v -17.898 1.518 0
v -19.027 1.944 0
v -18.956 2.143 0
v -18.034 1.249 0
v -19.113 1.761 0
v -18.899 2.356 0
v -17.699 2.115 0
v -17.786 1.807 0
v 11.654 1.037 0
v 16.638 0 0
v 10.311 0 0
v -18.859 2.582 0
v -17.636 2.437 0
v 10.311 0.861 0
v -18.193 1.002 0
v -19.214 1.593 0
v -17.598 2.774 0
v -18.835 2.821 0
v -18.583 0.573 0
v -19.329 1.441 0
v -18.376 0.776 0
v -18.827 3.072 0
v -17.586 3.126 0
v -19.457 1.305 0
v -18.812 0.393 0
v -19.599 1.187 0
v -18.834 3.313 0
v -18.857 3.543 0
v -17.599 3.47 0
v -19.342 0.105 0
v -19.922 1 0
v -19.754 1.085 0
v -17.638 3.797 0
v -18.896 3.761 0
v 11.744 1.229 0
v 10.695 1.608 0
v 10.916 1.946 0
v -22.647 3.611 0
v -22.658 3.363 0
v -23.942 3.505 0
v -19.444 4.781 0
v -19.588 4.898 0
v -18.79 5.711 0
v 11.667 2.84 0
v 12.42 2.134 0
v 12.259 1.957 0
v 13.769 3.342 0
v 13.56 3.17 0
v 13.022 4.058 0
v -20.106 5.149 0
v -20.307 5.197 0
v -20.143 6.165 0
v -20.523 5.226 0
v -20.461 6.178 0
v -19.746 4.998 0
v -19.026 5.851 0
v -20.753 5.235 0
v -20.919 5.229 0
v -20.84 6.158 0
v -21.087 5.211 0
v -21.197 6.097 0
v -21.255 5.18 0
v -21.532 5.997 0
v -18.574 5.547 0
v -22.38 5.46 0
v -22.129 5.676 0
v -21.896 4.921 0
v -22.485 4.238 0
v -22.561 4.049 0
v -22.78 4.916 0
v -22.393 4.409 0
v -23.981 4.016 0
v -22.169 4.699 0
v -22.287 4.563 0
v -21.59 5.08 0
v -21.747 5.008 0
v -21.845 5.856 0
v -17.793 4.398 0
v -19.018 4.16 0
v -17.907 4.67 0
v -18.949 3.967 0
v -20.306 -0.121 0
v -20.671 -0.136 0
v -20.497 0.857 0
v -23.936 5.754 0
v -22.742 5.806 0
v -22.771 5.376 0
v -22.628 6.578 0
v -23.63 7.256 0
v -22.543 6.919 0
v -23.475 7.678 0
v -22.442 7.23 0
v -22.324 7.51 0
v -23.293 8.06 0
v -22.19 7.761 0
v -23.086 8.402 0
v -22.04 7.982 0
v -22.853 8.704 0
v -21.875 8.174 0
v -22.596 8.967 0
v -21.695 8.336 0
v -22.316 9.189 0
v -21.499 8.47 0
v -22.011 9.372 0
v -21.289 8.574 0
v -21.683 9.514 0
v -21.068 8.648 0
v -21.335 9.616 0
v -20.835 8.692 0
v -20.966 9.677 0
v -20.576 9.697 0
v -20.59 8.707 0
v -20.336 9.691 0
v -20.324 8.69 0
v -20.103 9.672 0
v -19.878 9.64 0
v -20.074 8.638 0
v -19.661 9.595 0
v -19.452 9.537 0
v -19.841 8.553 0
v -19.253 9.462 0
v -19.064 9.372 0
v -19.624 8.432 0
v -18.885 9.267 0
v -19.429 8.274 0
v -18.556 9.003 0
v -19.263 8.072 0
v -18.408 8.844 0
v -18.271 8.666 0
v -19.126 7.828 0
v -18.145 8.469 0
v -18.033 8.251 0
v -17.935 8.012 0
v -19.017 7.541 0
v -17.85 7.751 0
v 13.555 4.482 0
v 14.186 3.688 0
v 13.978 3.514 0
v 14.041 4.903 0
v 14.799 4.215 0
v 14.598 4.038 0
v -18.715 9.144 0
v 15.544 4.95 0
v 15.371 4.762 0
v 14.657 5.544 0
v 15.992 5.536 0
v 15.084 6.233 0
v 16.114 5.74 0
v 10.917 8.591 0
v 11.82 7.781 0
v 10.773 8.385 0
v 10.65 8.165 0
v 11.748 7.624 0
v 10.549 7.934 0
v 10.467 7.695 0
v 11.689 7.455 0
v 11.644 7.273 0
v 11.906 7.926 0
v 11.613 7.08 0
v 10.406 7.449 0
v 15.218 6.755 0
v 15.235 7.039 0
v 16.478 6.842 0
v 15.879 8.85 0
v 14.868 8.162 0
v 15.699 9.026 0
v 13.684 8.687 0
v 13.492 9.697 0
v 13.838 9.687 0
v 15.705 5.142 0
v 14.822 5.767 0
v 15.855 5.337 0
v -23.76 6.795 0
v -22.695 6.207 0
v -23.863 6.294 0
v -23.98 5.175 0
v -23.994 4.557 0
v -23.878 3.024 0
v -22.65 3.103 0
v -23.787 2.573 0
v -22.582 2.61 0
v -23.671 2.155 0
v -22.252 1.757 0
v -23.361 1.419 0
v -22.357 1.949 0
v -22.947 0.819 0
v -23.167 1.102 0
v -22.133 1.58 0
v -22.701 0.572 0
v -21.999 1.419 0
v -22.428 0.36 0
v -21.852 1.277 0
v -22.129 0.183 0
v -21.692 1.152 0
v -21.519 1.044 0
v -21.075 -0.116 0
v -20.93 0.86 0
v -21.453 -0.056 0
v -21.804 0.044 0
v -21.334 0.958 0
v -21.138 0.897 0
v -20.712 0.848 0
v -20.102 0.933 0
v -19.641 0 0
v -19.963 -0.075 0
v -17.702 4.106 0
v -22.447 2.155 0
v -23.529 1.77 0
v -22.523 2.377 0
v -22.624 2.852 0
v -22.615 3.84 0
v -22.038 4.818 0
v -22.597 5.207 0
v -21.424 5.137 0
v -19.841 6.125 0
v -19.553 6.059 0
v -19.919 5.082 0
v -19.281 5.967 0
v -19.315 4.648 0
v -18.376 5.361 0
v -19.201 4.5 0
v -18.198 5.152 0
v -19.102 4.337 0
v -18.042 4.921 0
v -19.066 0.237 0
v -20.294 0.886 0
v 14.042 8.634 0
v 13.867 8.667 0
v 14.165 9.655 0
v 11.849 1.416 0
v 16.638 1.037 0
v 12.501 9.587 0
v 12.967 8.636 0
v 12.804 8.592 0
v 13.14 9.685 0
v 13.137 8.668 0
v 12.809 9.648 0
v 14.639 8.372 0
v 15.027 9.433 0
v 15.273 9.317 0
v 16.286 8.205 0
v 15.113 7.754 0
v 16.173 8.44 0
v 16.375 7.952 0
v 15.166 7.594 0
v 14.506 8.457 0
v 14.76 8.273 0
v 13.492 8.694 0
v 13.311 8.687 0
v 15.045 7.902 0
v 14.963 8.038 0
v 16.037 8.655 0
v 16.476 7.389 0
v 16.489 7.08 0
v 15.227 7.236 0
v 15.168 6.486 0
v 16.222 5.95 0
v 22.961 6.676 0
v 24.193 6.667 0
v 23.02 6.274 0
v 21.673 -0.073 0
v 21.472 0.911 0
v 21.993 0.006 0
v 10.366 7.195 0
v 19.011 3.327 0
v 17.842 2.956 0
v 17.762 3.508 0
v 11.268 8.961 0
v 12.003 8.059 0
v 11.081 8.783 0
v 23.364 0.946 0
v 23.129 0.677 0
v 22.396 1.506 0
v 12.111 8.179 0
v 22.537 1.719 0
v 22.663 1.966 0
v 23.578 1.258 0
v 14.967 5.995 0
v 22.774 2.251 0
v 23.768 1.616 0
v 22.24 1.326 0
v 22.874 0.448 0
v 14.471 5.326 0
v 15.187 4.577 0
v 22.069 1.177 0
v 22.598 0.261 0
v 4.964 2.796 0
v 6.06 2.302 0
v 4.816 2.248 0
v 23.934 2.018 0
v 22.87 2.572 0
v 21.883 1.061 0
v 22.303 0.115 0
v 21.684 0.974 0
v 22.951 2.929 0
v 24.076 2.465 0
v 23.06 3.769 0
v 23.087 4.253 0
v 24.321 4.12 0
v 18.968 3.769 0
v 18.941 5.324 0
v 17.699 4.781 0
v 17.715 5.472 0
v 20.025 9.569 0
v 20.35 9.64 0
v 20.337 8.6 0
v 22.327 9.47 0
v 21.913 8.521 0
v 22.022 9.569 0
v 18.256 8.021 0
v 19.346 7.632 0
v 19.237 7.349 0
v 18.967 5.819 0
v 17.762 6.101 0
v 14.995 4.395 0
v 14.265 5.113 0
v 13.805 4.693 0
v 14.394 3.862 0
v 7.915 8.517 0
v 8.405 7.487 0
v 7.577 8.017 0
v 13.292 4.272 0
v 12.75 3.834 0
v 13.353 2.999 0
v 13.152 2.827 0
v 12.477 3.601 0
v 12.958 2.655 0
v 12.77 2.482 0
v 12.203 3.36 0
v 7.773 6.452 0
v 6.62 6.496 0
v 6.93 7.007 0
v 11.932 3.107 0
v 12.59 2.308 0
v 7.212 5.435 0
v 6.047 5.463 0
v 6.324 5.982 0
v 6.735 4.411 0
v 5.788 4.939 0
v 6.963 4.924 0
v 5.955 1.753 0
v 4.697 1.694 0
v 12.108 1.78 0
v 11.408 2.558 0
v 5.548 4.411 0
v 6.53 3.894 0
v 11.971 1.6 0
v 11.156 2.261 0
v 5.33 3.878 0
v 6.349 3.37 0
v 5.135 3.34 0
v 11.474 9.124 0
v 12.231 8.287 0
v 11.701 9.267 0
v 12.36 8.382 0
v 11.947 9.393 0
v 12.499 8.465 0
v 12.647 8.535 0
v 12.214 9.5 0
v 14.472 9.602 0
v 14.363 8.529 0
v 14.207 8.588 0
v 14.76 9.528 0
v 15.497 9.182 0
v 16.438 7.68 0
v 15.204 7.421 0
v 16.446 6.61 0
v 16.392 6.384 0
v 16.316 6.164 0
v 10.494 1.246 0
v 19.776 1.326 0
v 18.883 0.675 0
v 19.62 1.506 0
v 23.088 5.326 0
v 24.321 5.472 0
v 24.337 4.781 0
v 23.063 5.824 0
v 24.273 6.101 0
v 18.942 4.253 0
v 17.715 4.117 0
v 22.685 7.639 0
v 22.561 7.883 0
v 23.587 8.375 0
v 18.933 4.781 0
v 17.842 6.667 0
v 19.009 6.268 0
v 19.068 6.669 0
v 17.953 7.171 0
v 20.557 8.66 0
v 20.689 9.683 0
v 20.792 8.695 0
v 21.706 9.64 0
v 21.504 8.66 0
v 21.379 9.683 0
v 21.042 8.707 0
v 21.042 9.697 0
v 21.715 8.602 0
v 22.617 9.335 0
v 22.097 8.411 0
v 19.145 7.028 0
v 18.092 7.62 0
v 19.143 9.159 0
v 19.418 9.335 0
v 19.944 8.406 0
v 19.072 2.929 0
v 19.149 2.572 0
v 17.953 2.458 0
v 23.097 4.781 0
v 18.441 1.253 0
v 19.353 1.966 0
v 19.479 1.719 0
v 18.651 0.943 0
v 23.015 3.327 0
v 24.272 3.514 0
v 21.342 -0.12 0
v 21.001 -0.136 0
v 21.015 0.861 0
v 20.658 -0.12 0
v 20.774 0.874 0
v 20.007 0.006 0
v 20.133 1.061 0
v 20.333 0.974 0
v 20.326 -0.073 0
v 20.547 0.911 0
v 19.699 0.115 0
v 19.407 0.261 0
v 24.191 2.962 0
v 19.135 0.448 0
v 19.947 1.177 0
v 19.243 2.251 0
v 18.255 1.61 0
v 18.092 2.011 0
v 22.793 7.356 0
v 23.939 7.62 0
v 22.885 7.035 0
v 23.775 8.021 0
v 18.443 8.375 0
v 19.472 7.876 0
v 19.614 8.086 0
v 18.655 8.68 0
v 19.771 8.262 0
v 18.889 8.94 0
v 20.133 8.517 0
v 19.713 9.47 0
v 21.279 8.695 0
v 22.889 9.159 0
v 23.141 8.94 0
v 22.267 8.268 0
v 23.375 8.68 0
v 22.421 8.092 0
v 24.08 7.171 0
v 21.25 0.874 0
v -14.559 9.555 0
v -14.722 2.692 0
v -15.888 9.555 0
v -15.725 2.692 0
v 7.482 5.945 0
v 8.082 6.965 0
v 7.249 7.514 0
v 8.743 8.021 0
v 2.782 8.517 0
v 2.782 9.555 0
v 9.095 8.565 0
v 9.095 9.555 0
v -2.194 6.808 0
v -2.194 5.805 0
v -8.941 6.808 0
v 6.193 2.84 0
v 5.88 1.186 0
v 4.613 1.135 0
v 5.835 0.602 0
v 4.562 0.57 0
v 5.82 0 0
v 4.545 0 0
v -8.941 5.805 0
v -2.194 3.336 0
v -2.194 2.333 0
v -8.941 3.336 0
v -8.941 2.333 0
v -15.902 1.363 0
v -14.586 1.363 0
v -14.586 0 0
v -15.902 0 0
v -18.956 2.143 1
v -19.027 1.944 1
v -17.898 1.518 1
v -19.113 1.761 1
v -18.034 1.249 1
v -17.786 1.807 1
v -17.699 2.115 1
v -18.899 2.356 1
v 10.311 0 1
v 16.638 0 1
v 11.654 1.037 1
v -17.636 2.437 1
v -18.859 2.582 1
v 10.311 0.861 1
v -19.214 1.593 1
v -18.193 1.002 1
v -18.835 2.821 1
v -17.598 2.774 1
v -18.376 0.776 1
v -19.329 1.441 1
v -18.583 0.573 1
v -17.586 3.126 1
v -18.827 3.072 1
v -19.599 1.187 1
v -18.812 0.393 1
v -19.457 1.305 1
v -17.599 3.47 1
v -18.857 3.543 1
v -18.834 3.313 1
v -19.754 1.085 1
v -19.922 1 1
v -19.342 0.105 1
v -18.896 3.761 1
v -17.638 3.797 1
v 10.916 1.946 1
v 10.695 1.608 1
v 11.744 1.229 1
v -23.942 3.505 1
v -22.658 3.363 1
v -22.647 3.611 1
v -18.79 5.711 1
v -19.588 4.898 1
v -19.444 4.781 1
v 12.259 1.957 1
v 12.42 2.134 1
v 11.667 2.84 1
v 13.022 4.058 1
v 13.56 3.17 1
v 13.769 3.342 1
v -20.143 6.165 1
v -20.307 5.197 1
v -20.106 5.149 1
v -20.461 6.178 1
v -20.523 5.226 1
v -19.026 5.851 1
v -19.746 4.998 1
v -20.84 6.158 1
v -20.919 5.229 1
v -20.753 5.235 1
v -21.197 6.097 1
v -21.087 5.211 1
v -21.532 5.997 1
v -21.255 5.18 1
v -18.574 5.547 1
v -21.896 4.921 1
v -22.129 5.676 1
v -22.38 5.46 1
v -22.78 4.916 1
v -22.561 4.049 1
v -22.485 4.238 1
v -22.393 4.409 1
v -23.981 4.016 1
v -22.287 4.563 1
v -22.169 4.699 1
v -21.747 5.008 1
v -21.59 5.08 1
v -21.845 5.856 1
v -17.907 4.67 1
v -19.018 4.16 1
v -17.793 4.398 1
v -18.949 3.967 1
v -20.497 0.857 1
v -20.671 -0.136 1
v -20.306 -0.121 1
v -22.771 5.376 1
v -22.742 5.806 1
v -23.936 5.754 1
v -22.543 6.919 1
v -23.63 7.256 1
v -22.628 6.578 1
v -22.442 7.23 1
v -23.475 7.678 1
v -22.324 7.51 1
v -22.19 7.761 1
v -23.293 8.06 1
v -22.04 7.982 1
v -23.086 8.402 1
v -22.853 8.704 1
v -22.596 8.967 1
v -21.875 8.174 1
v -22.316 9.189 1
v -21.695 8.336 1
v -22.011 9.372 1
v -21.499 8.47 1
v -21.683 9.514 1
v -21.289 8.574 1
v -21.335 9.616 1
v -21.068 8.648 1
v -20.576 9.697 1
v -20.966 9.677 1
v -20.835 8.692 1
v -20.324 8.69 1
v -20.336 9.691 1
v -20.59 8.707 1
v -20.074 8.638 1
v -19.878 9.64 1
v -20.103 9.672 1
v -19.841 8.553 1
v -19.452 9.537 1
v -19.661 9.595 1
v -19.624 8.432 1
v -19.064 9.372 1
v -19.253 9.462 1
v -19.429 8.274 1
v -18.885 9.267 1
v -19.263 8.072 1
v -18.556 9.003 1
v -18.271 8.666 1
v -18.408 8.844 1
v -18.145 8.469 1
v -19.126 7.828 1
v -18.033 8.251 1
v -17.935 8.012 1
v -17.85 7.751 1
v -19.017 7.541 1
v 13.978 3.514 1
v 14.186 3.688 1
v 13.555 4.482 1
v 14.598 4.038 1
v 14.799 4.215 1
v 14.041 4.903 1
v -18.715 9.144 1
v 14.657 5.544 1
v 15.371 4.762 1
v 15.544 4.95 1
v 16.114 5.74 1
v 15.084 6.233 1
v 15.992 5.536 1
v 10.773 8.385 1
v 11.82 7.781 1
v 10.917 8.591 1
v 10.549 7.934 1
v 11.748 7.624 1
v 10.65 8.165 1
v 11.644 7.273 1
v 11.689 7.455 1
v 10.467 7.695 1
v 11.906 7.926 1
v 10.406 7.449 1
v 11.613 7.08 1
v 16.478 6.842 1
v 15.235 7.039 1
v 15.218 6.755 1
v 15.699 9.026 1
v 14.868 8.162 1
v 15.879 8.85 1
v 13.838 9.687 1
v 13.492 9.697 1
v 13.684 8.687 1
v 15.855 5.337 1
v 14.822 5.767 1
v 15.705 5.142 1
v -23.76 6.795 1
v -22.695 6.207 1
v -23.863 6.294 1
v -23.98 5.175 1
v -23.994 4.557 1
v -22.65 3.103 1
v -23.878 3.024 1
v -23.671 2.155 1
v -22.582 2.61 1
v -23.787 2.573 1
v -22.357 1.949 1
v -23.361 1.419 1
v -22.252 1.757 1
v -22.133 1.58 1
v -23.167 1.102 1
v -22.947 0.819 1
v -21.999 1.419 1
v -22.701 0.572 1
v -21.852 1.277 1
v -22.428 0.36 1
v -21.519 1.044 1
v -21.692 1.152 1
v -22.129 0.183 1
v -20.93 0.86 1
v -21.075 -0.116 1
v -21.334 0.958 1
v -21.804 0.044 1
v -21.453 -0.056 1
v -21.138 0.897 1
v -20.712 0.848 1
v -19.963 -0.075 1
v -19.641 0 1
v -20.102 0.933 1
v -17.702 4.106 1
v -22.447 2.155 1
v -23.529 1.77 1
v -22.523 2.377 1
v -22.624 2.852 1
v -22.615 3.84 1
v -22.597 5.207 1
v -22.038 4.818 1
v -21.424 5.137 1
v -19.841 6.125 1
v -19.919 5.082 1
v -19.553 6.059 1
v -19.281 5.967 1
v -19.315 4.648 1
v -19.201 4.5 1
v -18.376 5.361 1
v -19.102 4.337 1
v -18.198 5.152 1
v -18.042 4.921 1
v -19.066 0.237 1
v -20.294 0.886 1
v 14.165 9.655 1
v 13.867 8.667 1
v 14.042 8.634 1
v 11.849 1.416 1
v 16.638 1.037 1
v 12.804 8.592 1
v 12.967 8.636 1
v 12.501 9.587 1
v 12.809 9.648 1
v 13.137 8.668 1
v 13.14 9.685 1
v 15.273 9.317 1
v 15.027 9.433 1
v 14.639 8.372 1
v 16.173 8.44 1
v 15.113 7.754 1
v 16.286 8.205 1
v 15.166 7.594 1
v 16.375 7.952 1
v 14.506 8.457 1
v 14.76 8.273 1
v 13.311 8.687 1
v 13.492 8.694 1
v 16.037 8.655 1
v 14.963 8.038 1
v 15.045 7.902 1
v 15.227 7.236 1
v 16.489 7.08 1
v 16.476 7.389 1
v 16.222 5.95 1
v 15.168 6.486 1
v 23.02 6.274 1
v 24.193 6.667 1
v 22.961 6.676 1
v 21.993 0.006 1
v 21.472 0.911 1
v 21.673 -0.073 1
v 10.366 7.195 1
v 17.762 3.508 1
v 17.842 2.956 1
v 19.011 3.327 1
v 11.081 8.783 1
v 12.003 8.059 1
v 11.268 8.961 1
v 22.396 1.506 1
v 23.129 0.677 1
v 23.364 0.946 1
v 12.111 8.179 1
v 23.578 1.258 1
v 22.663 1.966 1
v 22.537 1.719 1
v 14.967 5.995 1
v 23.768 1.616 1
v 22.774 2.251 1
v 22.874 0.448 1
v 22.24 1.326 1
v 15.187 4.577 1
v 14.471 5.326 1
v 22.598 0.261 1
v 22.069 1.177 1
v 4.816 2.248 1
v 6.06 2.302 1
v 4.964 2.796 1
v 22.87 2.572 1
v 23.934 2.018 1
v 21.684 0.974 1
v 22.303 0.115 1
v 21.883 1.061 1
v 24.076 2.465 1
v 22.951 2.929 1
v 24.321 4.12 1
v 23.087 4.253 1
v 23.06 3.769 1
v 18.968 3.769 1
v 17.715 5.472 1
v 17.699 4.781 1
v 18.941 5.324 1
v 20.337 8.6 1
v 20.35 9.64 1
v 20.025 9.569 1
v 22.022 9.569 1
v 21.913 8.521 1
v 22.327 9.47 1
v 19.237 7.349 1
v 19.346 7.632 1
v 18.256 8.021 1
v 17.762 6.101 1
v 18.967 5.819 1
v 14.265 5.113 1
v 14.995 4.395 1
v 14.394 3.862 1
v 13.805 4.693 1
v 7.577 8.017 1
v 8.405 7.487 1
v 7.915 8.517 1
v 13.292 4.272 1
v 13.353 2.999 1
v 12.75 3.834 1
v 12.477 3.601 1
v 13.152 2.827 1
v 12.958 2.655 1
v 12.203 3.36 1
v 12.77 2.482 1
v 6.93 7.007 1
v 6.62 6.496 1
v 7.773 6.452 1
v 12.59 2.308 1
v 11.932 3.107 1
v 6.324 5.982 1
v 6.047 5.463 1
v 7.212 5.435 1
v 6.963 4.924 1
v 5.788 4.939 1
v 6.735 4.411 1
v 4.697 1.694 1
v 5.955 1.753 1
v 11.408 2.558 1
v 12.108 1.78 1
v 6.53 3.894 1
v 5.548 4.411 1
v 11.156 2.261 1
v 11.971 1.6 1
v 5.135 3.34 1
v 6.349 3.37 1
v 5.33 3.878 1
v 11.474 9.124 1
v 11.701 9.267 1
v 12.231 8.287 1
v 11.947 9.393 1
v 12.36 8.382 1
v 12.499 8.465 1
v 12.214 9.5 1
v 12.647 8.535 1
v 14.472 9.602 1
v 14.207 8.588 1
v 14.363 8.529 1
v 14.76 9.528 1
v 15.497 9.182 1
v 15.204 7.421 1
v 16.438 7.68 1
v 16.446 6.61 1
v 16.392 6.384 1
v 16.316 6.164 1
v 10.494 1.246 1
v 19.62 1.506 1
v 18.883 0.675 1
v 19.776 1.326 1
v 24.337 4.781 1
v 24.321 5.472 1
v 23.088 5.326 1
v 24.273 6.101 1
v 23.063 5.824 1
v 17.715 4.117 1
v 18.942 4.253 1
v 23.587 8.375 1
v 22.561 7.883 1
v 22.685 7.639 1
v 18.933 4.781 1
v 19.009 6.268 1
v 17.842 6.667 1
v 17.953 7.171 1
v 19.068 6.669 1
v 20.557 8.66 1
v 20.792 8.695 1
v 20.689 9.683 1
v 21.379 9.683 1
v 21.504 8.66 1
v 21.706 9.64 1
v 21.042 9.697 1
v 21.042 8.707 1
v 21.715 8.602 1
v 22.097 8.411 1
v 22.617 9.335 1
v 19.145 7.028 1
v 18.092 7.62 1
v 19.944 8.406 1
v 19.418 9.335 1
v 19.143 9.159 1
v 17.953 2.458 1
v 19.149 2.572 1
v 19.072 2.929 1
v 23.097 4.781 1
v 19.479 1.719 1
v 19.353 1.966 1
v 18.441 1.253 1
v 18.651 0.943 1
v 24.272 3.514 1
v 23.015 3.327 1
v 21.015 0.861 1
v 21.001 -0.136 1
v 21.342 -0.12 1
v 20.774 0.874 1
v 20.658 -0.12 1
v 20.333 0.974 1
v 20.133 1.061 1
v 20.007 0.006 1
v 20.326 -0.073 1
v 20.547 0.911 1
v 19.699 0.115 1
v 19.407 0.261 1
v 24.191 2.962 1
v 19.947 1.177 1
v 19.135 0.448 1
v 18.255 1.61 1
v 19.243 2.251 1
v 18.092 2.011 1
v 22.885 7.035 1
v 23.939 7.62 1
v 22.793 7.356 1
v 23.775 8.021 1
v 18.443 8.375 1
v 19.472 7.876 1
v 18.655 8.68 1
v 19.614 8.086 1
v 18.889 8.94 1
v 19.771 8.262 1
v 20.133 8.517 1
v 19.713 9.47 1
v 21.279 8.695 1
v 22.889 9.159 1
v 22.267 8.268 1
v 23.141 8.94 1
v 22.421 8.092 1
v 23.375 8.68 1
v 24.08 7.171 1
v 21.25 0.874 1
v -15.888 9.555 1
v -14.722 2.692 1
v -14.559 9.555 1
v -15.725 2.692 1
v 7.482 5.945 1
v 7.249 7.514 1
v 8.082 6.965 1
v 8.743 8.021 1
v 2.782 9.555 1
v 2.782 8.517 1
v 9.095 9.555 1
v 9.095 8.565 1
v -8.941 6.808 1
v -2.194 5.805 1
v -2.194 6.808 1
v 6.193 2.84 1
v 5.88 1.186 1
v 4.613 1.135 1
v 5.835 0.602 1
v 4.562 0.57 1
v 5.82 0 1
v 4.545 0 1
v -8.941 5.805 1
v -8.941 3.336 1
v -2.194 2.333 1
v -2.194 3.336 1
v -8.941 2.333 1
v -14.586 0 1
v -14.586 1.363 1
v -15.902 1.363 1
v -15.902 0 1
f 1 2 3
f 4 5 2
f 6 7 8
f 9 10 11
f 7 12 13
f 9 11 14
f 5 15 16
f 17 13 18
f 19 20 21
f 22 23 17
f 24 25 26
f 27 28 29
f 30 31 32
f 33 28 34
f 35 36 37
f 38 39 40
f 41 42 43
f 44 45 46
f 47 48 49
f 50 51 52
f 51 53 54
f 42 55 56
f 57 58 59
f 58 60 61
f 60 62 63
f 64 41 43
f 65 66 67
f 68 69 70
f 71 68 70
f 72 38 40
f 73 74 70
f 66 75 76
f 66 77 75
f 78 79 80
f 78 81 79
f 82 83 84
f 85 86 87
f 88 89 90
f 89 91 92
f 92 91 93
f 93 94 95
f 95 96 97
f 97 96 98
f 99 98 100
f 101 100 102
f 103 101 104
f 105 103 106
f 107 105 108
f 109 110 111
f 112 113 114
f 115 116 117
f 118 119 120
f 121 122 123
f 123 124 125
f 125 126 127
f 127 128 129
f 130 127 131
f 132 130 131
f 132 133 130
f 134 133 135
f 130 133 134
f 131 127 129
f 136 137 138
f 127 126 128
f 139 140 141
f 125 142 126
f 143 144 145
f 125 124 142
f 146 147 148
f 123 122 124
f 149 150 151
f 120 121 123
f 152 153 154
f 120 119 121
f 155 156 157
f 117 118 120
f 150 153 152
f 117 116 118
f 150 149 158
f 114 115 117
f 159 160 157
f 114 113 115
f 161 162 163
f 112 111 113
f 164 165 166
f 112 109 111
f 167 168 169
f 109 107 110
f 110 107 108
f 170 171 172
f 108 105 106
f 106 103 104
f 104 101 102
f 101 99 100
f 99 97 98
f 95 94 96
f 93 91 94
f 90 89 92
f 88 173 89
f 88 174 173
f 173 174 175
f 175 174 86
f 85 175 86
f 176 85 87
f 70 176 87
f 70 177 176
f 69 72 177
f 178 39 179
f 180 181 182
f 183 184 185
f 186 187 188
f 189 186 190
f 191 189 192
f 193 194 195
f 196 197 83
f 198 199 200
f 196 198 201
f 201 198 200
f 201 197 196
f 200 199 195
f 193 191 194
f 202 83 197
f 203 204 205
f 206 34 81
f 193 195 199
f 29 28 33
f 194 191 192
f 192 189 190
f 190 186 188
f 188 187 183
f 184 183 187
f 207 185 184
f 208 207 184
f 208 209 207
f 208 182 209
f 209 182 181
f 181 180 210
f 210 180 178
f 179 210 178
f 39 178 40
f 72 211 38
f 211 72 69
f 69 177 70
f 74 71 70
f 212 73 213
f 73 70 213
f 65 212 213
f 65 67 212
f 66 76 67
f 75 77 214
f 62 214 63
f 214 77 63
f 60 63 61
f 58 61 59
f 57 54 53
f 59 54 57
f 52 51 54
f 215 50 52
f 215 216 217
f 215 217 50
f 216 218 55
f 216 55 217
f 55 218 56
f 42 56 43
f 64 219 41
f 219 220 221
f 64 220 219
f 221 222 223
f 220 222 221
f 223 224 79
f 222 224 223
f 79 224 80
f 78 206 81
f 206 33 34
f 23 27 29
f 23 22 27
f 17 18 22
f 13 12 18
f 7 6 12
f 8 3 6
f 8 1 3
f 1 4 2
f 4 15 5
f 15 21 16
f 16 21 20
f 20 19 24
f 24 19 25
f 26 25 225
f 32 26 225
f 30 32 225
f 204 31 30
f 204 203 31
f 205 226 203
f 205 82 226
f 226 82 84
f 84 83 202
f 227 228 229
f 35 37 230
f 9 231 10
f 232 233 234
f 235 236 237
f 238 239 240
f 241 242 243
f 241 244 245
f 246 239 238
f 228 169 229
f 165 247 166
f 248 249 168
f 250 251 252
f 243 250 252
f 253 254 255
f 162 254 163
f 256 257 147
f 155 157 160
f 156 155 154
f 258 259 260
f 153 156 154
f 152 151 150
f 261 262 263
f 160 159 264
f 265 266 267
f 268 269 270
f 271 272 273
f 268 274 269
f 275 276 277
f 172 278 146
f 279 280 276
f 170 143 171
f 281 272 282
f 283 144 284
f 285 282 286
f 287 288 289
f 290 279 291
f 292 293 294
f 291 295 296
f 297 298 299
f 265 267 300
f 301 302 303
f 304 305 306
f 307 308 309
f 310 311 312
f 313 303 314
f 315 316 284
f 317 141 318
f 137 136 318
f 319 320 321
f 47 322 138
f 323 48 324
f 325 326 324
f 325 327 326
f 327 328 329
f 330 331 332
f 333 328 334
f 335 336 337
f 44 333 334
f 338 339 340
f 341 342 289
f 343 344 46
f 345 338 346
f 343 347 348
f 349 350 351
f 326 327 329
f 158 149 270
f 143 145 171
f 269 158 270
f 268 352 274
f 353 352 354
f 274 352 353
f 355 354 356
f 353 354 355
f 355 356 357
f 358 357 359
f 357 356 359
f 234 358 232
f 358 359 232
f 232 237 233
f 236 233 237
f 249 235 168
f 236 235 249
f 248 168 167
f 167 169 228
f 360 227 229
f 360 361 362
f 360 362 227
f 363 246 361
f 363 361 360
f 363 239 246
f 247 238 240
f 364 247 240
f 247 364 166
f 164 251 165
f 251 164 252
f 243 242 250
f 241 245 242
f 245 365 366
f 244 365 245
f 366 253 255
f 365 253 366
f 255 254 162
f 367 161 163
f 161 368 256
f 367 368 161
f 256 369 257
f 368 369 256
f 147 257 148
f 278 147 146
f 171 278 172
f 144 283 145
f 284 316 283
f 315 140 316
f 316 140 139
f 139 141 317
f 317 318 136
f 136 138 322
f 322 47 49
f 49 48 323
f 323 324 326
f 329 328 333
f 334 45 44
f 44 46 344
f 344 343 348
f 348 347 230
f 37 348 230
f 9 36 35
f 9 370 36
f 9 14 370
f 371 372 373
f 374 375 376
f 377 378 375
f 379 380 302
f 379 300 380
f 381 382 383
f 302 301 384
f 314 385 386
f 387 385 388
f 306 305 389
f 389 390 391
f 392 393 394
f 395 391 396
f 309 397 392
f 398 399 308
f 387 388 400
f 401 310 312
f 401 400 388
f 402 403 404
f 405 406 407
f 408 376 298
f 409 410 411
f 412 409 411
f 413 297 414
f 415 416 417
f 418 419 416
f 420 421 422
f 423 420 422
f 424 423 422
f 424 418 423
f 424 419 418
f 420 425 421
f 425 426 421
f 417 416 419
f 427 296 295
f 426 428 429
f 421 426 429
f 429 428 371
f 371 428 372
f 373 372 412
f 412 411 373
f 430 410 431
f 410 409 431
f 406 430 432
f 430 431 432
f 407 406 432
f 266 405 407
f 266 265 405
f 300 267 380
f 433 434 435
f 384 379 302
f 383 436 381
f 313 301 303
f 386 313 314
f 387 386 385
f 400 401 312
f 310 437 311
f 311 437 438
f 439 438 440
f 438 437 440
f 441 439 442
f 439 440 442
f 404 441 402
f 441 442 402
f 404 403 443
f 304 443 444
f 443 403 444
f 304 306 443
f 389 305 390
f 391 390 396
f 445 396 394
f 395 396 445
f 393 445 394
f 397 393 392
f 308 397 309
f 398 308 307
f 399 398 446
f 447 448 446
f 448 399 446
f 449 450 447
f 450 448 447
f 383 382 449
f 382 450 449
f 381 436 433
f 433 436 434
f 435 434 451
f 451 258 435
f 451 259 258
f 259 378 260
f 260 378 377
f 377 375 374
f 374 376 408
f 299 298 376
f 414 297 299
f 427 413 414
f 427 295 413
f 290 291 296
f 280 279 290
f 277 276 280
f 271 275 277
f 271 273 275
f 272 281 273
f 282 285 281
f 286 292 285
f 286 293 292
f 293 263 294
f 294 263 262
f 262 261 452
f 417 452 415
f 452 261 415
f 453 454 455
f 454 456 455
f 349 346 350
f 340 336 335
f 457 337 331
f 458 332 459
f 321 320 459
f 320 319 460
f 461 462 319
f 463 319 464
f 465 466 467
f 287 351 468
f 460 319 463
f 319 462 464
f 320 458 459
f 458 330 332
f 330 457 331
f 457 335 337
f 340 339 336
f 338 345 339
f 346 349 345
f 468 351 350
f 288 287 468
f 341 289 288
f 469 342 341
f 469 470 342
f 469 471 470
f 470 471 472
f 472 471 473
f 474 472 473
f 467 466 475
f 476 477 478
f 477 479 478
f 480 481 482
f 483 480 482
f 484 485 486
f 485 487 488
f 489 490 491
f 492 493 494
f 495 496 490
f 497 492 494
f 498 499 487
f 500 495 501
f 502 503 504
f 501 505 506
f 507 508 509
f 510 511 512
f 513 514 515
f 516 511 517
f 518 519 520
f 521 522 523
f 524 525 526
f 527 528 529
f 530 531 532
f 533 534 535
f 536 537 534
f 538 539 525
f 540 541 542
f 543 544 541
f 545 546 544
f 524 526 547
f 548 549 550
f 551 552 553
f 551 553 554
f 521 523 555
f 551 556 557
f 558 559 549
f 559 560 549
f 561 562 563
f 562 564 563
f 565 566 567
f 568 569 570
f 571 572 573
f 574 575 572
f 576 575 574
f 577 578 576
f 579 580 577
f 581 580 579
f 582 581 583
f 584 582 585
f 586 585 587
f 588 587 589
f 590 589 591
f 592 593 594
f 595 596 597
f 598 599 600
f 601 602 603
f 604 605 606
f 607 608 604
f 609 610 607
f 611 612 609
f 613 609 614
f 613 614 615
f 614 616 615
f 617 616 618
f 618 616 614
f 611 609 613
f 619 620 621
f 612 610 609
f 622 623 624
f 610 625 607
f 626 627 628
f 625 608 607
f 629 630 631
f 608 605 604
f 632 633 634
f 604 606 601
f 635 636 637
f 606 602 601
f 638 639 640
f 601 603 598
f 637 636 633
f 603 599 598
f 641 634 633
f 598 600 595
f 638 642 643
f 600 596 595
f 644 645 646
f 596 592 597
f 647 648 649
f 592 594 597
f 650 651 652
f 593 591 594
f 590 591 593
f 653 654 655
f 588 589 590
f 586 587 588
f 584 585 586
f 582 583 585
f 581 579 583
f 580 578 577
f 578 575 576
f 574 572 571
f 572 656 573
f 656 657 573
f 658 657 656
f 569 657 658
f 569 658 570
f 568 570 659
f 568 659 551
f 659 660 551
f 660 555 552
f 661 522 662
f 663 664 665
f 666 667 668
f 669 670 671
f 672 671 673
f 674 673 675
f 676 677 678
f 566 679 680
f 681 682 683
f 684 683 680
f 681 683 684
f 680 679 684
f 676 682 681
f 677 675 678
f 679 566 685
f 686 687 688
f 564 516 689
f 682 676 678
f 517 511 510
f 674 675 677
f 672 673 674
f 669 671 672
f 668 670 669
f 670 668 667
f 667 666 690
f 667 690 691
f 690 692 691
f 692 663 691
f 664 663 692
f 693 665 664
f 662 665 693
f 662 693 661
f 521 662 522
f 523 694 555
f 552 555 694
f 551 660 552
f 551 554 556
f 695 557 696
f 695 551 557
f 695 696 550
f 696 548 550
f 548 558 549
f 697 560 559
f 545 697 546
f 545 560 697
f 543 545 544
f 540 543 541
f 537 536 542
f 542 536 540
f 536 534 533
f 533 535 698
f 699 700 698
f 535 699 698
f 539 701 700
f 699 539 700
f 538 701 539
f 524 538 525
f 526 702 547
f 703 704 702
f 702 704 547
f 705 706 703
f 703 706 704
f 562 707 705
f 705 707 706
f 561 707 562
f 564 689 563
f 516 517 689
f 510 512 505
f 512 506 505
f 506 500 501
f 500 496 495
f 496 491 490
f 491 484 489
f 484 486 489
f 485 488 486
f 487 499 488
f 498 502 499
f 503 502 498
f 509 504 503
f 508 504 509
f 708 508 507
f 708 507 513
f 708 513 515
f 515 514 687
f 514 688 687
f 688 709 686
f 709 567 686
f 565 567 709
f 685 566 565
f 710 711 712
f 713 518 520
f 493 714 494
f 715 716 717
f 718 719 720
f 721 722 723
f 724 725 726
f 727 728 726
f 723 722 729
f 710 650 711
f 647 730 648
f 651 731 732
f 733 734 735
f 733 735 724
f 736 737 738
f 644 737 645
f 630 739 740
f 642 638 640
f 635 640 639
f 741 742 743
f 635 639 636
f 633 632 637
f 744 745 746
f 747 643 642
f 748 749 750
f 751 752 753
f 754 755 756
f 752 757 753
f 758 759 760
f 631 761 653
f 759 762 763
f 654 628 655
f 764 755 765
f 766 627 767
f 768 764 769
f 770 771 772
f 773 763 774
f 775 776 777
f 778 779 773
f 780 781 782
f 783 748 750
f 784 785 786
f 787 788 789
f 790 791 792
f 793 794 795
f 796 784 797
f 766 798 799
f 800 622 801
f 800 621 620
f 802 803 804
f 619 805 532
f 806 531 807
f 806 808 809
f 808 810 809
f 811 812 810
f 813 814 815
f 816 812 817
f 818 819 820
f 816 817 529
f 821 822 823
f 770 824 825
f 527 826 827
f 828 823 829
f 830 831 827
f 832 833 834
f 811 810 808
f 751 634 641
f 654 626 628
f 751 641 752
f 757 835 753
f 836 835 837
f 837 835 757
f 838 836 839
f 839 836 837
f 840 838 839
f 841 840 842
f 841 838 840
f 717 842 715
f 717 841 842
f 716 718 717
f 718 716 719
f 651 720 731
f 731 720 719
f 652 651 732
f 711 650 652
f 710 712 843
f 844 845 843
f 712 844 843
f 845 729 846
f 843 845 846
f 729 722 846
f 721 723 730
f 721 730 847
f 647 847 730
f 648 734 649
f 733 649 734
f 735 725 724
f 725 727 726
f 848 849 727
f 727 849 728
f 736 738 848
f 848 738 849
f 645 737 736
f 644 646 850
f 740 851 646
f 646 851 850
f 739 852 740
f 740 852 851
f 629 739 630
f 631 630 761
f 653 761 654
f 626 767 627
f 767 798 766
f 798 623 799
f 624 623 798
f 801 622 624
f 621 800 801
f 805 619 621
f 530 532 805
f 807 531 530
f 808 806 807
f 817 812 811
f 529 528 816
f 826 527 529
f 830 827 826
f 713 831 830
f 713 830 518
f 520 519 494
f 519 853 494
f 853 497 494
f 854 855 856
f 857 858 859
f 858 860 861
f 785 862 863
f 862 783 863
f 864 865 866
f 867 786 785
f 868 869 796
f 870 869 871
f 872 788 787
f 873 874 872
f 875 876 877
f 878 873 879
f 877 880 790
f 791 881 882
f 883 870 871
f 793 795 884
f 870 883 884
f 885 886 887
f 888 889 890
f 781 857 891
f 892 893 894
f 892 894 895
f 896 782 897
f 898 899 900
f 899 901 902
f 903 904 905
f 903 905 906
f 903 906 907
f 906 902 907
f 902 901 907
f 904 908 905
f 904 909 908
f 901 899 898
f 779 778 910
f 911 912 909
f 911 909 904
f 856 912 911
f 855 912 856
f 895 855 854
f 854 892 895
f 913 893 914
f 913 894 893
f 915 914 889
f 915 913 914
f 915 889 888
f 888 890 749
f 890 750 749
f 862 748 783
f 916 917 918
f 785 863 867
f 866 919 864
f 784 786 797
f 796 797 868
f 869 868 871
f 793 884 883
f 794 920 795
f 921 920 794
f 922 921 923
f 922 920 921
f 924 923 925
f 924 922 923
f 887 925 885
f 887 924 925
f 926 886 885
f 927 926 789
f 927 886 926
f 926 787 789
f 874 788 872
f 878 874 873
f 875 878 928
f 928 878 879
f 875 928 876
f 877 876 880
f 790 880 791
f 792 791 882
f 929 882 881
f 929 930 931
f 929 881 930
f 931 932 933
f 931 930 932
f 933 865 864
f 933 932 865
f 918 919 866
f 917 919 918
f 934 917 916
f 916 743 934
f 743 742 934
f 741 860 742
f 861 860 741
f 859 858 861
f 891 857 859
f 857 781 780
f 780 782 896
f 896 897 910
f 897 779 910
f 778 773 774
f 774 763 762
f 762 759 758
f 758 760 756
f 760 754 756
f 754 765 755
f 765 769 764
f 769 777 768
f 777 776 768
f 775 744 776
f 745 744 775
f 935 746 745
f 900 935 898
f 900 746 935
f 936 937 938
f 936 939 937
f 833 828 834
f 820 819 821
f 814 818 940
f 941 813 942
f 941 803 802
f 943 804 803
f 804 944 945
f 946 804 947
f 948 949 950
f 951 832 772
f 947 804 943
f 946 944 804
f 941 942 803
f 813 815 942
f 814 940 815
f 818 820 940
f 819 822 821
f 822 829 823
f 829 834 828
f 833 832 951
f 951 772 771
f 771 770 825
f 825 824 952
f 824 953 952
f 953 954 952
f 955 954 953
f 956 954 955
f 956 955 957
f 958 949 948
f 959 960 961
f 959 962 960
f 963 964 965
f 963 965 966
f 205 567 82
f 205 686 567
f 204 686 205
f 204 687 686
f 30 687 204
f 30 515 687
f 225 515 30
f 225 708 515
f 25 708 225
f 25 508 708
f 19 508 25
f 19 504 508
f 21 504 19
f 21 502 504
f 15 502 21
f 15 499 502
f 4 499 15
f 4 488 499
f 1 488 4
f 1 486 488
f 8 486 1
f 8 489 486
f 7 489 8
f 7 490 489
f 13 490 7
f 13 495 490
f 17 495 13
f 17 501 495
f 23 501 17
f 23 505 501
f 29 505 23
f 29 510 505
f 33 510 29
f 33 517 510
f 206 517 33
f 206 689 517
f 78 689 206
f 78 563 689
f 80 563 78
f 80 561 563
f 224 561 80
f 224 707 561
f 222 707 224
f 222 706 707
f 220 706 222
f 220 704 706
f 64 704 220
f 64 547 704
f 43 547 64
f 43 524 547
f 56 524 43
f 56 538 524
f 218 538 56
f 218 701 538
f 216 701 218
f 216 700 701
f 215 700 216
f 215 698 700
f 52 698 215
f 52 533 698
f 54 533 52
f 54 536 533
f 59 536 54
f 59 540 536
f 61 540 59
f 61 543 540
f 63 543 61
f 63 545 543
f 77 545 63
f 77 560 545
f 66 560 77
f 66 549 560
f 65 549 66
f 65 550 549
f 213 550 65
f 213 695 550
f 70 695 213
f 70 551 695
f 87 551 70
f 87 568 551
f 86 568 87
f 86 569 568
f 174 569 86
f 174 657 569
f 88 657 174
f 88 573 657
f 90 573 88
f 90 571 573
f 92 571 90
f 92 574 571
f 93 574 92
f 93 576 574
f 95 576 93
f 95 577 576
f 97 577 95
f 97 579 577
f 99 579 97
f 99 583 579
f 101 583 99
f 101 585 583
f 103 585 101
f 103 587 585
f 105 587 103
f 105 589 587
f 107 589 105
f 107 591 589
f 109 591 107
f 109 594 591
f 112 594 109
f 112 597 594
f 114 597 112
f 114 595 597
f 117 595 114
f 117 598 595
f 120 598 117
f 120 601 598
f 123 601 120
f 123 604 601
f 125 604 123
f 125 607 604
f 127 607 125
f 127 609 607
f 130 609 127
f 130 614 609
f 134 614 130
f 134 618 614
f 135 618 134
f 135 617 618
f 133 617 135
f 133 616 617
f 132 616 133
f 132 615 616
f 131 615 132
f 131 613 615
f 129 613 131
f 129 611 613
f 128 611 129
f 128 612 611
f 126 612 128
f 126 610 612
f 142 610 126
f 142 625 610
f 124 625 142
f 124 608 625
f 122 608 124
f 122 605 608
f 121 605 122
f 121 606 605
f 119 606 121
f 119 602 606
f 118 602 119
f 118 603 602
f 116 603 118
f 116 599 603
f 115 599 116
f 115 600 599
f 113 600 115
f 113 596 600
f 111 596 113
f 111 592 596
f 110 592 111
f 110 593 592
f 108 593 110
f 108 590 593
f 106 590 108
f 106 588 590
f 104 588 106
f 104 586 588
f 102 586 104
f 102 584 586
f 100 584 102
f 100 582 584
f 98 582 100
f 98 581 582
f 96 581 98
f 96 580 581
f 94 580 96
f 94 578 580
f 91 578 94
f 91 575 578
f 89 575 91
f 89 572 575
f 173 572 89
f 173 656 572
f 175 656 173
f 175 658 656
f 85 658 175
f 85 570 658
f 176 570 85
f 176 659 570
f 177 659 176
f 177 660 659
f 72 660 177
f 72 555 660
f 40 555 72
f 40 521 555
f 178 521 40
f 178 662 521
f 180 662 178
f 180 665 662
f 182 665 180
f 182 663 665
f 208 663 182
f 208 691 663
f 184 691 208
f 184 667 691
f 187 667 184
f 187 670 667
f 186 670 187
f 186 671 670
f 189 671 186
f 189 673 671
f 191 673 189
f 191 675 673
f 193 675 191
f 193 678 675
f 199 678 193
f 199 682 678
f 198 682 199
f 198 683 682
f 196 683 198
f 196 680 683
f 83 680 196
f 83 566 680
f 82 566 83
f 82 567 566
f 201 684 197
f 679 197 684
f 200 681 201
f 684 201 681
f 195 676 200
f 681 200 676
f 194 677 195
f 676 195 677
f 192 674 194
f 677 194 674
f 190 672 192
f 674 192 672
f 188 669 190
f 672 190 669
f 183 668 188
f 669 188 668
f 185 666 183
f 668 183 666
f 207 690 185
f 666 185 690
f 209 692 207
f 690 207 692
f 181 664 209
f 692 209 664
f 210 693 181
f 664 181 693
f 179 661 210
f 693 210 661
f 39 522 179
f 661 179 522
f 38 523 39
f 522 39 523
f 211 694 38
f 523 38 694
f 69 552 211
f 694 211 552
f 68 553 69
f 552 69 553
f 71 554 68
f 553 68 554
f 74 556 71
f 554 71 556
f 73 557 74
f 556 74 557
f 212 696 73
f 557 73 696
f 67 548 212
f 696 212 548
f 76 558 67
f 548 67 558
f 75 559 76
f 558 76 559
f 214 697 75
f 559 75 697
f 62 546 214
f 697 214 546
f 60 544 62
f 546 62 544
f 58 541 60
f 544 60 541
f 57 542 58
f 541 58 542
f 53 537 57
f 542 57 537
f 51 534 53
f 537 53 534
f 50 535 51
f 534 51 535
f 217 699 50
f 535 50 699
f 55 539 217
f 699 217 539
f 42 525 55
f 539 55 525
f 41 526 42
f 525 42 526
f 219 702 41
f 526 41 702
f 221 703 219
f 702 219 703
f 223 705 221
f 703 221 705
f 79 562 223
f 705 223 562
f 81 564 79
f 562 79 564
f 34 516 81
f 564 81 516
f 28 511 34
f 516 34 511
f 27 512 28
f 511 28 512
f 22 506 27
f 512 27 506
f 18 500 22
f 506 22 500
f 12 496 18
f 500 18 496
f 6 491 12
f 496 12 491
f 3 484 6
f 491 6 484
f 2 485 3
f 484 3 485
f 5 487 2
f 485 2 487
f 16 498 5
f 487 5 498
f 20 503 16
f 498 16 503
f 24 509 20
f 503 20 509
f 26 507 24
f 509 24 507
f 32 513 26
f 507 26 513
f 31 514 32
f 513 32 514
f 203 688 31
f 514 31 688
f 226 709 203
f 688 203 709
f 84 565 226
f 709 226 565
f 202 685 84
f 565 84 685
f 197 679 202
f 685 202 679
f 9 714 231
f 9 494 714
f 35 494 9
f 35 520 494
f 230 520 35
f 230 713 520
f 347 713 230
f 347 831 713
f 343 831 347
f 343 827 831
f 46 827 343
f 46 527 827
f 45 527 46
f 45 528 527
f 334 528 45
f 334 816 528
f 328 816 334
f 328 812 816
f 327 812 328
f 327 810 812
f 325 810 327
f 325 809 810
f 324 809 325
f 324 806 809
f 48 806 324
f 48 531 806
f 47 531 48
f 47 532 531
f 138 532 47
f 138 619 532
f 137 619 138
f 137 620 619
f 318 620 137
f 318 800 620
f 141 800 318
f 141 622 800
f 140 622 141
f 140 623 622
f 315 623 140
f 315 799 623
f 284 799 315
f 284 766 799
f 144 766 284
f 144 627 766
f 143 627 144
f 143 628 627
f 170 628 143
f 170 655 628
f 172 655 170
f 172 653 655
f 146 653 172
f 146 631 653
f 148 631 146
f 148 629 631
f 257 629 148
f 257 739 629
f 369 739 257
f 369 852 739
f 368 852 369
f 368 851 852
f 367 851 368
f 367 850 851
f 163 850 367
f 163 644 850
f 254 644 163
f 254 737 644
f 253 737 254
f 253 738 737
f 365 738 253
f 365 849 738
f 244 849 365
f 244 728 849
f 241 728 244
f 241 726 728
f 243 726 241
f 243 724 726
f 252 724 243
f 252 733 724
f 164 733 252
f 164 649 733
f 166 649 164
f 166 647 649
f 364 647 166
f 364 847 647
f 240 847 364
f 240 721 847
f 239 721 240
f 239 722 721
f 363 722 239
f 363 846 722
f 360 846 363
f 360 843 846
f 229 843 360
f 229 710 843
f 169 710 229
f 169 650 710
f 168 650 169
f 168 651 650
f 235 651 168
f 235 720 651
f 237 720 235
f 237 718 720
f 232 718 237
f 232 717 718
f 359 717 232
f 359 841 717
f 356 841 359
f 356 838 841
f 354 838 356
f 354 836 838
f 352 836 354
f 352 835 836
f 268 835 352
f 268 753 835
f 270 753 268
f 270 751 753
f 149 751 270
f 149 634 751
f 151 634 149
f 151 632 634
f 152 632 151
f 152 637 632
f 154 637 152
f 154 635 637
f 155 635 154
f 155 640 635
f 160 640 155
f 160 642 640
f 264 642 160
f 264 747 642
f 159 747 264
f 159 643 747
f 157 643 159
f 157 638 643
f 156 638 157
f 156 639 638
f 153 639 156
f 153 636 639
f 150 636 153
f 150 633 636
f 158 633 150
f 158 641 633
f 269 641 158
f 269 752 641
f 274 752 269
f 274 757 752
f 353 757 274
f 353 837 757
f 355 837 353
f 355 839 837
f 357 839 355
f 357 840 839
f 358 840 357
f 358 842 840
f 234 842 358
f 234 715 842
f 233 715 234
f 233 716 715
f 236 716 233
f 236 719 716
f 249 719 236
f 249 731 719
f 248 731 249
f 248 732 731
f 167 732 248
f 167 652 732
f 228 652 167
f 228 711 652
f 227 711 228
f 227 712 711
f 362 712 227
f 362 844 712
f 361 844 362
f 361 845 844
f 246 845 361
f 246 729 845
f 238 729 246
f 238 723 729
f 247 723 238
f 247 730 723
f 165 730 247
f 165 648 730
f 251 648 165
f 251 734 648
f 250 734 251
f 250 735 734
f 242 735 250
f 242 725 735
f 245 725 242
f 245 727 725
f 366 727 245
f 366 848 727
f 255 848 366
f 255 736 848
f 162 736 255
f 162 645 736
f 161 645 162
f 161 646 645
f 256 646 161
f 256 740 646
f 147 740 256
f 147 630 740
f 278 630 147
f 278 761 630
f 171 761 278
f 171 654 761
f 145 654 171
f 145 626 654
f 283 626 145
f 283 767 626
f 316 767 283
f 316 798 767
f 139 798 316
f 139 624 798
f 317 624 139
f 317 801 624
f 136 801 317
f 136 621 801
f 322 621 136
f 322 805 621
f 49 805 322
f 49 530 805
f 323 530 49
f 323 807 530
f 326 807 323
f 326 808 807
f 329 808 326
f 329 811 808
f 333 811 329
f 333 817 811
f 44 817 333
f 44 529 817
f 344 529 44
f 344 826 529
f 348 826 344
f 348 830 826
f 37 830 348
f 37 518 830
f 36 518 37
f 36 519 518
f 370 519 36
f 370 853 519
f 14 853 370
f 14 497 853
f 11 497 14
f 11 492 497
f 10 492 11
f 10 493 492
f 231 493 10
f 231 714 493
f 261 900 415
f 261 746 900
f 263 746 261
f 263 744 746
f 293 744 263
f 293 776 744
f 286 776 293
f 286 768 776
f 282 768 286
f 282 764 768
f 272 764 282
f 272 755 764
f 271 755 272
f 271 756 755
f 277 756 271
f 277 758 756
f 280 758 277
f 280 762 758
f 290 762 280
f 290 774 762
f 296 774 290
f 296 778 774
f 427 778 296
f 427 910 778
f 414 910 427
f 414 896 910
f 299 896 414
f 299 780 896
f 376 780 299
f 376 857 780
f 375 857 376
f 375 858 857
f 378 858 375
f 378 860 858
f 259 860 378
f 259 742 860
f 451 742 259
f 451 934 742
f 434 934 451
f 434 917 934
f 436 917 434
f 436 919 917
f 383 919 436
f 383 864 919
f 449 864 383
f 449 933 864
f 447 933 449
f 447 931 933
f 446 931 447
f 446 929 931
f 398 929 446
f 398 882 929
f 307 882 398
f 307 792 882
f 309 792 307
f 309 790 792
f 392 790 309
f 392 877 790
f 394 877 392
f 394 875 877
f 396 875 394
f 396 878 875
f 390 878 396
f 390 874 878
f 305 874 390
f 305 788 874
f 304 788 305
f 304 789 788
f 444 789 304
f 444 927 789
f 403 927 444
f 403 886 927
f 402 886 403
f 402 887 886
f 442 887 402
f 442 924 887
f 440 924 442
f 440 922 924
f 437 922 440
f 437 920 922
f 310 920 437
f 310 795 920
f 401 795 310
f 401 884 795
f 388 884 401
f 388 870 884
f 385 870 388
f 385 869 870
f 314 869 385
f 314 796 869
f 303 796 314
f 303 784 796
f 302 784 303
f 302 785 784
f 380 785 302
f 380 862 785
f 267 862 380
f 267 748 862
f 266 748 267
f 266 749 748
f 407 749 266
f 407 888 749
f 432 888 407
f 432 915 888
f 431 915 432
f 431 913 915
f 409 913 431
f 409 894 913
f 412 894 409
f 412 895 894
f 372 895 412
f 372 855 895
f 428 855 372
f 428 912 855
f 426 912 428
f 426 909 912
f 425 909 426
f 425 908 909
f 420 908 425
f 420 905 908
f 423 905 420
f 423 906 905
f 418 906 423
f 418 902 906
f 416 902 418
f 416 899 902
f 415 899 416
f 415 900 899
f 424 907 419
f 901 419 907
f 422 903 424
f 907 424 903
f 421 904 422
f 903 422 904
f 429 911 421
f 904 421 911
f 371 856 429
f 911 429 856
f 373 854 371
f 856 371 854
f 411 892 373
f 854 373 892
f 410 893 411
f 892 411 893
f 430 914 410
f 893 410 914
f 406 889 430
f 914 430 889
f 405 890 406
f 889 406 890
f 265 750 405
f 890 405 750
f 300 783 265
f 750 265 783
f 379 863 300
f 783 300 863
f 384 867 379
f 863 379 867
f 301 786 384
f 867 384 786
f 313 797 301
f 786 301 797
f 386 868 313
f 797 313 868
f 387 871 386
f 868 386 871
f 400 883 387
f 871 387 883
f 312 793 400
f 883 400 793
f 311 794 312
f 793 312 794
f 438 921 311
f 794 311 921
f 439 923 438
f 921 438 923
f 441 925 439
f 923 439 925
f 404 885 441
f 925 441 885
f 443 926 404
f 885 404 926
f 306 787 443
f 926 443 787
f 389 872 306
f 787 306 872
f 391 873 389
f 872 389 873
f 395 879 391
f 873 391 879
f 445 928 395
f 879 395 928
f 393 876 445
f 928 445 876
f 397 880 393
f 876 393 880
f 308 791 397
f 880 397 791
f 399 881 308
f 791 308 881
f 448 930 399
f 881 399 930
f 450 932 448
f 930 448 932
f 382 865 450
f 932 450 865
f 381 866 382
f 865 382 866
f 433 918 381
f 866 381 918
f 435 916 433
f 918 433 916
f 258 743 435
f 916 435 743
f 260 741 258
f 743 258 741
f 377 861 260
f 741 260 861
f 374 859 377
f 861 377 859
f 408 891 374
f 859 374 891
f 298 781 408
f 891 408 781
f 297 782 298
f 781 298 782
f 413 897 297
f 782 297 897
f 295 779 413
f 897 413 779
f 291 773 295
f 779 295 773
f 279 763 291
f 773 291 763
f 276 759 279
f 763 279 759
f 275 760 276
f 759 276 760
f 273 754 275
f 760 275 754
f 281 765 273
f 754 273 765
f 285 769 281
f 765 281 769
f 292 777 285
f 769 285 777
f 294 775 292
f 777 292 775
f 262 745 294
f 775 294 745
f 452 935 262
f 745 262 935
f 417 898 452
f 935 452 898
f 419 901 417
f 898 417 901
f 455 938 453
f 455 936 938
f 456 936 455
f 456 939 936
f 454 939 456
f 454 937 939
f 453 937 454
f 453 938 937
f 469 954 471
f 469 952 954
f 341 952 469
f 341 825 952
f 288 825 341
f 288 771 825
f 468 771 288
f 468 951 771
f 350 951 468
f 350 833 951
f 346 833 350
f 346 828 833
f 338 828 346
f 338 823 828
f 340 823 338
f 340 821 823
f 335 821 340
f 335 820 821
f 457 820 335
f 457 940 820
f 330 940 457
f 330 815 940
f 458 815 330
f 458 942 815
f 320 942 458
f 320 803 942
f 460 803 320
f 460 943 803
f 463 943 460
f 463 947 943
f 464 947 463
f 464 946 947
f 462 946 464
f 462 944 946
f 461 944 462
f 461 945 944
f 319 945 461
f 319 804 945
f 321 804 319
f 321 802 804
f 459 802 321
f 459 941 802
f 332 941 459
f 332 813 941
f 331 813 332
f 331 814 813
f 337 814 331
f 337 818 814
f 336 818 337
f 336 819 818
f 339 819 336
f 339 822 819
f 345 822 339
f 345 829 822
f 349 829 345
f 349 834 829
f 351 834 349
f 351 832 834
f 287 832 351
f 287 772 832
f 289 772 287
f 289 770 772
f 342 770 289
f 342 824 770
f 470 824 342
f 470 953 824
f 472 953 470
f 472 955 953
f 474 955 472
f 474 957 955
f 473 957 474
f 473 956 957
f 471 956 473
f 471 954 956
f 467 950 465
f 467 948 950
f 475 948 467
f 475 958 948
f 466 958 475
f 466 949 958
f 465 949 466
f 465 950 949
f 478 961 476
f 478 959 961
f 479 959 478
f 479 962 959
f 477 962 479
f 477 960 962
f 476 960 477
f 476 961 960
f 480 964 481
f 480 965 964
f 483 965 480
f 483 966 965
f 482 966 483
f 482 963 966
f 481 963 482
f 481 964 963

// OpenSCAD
// recursionscad:  Basic recursion example 

// Recursive functions are very powerful for calculating values.
// A good number of algorithms make use of recursive definitions,
// e.g the caluclation of the factorial of a number.
// The ternary operator " ? : " is the easiest way to define the
// termination condition.
// Note how the following simple implementation will never terminate
// when called with a negative value. This will produce an error after
// some time when OpenSCAD detects the endless recursive call.
function factorial(n) = n == 0 ? 1 : factorial(n - 1) * n;

color("cyan")
        linear_extrude(height = 1)
            text(str("6! = ", factorial(6)), halign = "center");

echo(version=version());
// Written in 2015 by Torsten Paul <Torsten.Paul@gmx.de>
//
// To the extent possible under law, the author(s) have dedicated all
// copyright and related and neighboring rights to this software to the
// public domain worldwide. This software is distributed without any
// warranty.
//
// You should have received a copy of the CC0 Public Domain
// Dedication along with this software.
// If not, see <http://creativecommons.org/publicdomain/zero/1.0/>.
